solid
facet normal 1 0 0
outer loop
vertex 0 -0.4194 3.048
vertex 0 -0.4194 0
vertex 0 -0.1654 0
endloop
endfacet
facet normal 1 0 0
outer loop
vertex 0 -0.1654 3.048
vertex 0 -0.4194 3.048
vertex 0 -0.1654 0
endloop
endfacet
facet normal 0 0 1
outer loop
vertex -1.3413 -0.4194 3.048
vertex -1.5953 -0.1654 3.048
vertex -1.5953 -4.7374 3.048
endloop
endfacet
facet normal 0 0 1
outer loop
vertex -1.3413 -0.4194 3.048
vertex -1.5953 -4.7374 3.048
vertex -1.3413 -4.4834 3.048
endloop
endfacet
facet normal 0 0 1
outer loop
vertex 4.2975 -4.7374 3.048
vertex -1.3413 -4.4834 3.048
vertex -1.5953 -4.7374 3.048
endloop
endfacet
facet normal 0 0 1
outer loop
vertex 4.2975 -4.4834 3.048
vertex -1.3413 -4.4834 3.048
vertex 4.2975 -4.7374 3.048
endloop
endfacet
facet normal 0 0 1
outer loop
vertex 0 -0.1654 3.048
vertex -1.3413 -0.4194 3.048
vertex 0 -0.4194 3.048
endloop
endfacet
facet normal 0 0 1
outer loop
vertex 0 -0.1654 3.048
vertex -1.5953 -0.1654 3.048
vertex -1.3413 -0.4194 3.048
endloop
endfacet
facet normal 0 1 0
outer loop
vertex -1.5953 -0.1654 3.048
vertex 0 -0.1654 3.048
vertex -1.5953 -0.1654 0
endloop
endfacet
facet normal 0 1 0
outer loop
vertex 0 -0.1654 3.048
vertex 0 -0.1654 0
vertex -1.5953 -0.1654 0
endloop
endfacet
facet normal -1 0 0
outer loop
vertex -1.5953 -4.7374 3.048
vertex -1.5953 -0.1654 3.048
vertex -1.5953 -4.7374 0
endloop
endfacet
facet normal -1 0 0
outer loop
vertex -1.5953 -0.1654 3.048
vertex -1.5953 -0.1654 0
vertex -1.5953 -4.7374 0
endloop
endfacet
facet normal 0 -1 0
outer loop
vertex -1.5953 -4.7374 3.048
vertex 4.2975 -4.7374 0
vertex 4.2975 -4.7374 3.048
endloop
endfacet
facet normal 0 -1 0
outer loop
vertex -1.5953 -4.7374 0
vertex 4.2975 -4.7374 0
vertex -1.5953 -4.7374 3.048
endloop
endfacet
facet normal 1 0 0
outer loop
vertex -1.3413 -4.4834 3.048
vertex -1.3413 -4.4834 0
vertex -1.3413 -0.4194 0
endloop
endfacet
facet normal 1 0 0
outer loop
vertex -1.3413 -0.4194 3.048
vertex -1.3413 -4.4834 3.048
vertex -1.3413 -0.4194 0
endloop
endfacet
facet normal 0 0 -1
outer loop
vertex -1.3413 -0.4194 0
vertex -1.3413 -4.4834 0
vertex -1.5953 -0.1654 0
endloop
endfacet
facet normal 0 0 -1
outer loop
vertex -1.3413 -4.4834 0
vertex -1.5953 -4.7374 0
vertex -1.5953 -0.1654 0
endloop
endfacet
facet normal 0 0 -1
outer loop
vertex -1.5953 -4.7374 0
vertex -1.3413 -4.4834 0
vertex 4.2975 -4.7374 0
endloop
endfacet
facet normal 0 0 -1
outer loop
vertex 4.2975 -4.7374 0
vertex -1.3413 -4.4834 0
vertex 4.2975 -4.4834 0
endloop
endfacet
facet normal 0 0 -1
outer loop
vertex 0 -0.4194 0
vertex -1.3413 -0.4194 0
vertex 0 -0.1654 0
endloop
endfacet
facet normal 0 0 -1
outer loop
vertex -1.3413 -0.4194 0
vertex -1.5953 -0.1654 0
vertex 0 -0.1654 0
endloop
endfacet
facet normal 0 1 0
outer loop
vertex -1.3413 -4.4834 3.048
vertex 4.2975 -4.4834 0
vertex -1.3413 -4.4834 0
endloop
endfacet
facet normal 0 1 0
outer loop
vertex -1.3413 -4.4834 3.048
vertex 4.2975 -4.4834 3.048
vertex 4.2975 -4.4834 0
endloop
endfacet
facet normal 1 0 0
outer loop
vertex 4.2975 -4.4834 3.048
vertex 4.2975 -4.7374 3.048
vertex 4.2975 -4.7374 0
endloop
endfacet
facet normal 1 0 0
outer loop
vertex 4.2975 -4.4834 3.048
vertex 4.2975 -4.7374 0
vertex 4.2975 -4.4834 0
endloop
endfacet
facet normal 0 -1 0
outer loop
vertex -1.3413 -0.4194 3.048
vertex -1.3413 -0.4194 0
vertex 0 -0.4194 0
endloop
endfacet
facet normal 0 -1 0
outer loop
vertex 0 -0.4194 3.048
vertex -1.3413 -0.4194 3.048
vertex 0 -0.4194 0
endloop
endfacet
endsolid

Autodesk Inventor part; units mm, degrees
ref_plane "YZ Plane" through (0, 0, 0) normal (1, 0, 0) x (0, 1, 0)
ref_plane "XZ Plane" through (0, 0, 0) normal (0, 1, 0) x (-1, 0, 0)
ref_plane "XY Plane" through (0, 0, 0) normal (0, 0, 1) x (1, 0, 0)
sketch "Sketch1" plane through (0, 0, 0) normal (0, 0, 1) x (1, 0, 0)
  line L0 (-1.3413, -0.4194) -> (0, -0.4194)
  line L1 (-1.3413, -4.7374) -> (-1.3413, -0.4194)
  line L2 (0, -0.1654) -> (-1.5953, -0.1654)
  line L3 (-1.5953, -0.1654) -> (-1.5953, -4.7374)
  line L4 (-1.3413, -4.7374) -> (-1.5953, -4.7374)
  line L5 (0, -0.4194) -> (0, -0.1654)
  point P0 (0, 0)
  dimension "d1" = 0.254
  dimension "d8" = 4.572
extrude "Extrusion1" add sketch "Sketch1" along normal blind 3.048
sketch "Sketch2" plane through (0, 0, 3.048) normal (0, 0, 1) x (1, 0, 0)
  line L0 (-1.3413, -4.7374) -> (4.2975, -4.7374)
  line L1 (4.2975, -4.7374) -> (4.2975, -4.4834)
  line L2 (4.2975, -4.4834) -> (-1.3413, -4.4834)
  line L3 (-1.3413, -4.4834) -> (-1.3413, -4.7374)
  dimension "d4" = 5.6388
  dimension "d5" = 0.254
extrude "Extrusion2" add sketch "Sketch2" against normal up to surface (3.048 mm away)
